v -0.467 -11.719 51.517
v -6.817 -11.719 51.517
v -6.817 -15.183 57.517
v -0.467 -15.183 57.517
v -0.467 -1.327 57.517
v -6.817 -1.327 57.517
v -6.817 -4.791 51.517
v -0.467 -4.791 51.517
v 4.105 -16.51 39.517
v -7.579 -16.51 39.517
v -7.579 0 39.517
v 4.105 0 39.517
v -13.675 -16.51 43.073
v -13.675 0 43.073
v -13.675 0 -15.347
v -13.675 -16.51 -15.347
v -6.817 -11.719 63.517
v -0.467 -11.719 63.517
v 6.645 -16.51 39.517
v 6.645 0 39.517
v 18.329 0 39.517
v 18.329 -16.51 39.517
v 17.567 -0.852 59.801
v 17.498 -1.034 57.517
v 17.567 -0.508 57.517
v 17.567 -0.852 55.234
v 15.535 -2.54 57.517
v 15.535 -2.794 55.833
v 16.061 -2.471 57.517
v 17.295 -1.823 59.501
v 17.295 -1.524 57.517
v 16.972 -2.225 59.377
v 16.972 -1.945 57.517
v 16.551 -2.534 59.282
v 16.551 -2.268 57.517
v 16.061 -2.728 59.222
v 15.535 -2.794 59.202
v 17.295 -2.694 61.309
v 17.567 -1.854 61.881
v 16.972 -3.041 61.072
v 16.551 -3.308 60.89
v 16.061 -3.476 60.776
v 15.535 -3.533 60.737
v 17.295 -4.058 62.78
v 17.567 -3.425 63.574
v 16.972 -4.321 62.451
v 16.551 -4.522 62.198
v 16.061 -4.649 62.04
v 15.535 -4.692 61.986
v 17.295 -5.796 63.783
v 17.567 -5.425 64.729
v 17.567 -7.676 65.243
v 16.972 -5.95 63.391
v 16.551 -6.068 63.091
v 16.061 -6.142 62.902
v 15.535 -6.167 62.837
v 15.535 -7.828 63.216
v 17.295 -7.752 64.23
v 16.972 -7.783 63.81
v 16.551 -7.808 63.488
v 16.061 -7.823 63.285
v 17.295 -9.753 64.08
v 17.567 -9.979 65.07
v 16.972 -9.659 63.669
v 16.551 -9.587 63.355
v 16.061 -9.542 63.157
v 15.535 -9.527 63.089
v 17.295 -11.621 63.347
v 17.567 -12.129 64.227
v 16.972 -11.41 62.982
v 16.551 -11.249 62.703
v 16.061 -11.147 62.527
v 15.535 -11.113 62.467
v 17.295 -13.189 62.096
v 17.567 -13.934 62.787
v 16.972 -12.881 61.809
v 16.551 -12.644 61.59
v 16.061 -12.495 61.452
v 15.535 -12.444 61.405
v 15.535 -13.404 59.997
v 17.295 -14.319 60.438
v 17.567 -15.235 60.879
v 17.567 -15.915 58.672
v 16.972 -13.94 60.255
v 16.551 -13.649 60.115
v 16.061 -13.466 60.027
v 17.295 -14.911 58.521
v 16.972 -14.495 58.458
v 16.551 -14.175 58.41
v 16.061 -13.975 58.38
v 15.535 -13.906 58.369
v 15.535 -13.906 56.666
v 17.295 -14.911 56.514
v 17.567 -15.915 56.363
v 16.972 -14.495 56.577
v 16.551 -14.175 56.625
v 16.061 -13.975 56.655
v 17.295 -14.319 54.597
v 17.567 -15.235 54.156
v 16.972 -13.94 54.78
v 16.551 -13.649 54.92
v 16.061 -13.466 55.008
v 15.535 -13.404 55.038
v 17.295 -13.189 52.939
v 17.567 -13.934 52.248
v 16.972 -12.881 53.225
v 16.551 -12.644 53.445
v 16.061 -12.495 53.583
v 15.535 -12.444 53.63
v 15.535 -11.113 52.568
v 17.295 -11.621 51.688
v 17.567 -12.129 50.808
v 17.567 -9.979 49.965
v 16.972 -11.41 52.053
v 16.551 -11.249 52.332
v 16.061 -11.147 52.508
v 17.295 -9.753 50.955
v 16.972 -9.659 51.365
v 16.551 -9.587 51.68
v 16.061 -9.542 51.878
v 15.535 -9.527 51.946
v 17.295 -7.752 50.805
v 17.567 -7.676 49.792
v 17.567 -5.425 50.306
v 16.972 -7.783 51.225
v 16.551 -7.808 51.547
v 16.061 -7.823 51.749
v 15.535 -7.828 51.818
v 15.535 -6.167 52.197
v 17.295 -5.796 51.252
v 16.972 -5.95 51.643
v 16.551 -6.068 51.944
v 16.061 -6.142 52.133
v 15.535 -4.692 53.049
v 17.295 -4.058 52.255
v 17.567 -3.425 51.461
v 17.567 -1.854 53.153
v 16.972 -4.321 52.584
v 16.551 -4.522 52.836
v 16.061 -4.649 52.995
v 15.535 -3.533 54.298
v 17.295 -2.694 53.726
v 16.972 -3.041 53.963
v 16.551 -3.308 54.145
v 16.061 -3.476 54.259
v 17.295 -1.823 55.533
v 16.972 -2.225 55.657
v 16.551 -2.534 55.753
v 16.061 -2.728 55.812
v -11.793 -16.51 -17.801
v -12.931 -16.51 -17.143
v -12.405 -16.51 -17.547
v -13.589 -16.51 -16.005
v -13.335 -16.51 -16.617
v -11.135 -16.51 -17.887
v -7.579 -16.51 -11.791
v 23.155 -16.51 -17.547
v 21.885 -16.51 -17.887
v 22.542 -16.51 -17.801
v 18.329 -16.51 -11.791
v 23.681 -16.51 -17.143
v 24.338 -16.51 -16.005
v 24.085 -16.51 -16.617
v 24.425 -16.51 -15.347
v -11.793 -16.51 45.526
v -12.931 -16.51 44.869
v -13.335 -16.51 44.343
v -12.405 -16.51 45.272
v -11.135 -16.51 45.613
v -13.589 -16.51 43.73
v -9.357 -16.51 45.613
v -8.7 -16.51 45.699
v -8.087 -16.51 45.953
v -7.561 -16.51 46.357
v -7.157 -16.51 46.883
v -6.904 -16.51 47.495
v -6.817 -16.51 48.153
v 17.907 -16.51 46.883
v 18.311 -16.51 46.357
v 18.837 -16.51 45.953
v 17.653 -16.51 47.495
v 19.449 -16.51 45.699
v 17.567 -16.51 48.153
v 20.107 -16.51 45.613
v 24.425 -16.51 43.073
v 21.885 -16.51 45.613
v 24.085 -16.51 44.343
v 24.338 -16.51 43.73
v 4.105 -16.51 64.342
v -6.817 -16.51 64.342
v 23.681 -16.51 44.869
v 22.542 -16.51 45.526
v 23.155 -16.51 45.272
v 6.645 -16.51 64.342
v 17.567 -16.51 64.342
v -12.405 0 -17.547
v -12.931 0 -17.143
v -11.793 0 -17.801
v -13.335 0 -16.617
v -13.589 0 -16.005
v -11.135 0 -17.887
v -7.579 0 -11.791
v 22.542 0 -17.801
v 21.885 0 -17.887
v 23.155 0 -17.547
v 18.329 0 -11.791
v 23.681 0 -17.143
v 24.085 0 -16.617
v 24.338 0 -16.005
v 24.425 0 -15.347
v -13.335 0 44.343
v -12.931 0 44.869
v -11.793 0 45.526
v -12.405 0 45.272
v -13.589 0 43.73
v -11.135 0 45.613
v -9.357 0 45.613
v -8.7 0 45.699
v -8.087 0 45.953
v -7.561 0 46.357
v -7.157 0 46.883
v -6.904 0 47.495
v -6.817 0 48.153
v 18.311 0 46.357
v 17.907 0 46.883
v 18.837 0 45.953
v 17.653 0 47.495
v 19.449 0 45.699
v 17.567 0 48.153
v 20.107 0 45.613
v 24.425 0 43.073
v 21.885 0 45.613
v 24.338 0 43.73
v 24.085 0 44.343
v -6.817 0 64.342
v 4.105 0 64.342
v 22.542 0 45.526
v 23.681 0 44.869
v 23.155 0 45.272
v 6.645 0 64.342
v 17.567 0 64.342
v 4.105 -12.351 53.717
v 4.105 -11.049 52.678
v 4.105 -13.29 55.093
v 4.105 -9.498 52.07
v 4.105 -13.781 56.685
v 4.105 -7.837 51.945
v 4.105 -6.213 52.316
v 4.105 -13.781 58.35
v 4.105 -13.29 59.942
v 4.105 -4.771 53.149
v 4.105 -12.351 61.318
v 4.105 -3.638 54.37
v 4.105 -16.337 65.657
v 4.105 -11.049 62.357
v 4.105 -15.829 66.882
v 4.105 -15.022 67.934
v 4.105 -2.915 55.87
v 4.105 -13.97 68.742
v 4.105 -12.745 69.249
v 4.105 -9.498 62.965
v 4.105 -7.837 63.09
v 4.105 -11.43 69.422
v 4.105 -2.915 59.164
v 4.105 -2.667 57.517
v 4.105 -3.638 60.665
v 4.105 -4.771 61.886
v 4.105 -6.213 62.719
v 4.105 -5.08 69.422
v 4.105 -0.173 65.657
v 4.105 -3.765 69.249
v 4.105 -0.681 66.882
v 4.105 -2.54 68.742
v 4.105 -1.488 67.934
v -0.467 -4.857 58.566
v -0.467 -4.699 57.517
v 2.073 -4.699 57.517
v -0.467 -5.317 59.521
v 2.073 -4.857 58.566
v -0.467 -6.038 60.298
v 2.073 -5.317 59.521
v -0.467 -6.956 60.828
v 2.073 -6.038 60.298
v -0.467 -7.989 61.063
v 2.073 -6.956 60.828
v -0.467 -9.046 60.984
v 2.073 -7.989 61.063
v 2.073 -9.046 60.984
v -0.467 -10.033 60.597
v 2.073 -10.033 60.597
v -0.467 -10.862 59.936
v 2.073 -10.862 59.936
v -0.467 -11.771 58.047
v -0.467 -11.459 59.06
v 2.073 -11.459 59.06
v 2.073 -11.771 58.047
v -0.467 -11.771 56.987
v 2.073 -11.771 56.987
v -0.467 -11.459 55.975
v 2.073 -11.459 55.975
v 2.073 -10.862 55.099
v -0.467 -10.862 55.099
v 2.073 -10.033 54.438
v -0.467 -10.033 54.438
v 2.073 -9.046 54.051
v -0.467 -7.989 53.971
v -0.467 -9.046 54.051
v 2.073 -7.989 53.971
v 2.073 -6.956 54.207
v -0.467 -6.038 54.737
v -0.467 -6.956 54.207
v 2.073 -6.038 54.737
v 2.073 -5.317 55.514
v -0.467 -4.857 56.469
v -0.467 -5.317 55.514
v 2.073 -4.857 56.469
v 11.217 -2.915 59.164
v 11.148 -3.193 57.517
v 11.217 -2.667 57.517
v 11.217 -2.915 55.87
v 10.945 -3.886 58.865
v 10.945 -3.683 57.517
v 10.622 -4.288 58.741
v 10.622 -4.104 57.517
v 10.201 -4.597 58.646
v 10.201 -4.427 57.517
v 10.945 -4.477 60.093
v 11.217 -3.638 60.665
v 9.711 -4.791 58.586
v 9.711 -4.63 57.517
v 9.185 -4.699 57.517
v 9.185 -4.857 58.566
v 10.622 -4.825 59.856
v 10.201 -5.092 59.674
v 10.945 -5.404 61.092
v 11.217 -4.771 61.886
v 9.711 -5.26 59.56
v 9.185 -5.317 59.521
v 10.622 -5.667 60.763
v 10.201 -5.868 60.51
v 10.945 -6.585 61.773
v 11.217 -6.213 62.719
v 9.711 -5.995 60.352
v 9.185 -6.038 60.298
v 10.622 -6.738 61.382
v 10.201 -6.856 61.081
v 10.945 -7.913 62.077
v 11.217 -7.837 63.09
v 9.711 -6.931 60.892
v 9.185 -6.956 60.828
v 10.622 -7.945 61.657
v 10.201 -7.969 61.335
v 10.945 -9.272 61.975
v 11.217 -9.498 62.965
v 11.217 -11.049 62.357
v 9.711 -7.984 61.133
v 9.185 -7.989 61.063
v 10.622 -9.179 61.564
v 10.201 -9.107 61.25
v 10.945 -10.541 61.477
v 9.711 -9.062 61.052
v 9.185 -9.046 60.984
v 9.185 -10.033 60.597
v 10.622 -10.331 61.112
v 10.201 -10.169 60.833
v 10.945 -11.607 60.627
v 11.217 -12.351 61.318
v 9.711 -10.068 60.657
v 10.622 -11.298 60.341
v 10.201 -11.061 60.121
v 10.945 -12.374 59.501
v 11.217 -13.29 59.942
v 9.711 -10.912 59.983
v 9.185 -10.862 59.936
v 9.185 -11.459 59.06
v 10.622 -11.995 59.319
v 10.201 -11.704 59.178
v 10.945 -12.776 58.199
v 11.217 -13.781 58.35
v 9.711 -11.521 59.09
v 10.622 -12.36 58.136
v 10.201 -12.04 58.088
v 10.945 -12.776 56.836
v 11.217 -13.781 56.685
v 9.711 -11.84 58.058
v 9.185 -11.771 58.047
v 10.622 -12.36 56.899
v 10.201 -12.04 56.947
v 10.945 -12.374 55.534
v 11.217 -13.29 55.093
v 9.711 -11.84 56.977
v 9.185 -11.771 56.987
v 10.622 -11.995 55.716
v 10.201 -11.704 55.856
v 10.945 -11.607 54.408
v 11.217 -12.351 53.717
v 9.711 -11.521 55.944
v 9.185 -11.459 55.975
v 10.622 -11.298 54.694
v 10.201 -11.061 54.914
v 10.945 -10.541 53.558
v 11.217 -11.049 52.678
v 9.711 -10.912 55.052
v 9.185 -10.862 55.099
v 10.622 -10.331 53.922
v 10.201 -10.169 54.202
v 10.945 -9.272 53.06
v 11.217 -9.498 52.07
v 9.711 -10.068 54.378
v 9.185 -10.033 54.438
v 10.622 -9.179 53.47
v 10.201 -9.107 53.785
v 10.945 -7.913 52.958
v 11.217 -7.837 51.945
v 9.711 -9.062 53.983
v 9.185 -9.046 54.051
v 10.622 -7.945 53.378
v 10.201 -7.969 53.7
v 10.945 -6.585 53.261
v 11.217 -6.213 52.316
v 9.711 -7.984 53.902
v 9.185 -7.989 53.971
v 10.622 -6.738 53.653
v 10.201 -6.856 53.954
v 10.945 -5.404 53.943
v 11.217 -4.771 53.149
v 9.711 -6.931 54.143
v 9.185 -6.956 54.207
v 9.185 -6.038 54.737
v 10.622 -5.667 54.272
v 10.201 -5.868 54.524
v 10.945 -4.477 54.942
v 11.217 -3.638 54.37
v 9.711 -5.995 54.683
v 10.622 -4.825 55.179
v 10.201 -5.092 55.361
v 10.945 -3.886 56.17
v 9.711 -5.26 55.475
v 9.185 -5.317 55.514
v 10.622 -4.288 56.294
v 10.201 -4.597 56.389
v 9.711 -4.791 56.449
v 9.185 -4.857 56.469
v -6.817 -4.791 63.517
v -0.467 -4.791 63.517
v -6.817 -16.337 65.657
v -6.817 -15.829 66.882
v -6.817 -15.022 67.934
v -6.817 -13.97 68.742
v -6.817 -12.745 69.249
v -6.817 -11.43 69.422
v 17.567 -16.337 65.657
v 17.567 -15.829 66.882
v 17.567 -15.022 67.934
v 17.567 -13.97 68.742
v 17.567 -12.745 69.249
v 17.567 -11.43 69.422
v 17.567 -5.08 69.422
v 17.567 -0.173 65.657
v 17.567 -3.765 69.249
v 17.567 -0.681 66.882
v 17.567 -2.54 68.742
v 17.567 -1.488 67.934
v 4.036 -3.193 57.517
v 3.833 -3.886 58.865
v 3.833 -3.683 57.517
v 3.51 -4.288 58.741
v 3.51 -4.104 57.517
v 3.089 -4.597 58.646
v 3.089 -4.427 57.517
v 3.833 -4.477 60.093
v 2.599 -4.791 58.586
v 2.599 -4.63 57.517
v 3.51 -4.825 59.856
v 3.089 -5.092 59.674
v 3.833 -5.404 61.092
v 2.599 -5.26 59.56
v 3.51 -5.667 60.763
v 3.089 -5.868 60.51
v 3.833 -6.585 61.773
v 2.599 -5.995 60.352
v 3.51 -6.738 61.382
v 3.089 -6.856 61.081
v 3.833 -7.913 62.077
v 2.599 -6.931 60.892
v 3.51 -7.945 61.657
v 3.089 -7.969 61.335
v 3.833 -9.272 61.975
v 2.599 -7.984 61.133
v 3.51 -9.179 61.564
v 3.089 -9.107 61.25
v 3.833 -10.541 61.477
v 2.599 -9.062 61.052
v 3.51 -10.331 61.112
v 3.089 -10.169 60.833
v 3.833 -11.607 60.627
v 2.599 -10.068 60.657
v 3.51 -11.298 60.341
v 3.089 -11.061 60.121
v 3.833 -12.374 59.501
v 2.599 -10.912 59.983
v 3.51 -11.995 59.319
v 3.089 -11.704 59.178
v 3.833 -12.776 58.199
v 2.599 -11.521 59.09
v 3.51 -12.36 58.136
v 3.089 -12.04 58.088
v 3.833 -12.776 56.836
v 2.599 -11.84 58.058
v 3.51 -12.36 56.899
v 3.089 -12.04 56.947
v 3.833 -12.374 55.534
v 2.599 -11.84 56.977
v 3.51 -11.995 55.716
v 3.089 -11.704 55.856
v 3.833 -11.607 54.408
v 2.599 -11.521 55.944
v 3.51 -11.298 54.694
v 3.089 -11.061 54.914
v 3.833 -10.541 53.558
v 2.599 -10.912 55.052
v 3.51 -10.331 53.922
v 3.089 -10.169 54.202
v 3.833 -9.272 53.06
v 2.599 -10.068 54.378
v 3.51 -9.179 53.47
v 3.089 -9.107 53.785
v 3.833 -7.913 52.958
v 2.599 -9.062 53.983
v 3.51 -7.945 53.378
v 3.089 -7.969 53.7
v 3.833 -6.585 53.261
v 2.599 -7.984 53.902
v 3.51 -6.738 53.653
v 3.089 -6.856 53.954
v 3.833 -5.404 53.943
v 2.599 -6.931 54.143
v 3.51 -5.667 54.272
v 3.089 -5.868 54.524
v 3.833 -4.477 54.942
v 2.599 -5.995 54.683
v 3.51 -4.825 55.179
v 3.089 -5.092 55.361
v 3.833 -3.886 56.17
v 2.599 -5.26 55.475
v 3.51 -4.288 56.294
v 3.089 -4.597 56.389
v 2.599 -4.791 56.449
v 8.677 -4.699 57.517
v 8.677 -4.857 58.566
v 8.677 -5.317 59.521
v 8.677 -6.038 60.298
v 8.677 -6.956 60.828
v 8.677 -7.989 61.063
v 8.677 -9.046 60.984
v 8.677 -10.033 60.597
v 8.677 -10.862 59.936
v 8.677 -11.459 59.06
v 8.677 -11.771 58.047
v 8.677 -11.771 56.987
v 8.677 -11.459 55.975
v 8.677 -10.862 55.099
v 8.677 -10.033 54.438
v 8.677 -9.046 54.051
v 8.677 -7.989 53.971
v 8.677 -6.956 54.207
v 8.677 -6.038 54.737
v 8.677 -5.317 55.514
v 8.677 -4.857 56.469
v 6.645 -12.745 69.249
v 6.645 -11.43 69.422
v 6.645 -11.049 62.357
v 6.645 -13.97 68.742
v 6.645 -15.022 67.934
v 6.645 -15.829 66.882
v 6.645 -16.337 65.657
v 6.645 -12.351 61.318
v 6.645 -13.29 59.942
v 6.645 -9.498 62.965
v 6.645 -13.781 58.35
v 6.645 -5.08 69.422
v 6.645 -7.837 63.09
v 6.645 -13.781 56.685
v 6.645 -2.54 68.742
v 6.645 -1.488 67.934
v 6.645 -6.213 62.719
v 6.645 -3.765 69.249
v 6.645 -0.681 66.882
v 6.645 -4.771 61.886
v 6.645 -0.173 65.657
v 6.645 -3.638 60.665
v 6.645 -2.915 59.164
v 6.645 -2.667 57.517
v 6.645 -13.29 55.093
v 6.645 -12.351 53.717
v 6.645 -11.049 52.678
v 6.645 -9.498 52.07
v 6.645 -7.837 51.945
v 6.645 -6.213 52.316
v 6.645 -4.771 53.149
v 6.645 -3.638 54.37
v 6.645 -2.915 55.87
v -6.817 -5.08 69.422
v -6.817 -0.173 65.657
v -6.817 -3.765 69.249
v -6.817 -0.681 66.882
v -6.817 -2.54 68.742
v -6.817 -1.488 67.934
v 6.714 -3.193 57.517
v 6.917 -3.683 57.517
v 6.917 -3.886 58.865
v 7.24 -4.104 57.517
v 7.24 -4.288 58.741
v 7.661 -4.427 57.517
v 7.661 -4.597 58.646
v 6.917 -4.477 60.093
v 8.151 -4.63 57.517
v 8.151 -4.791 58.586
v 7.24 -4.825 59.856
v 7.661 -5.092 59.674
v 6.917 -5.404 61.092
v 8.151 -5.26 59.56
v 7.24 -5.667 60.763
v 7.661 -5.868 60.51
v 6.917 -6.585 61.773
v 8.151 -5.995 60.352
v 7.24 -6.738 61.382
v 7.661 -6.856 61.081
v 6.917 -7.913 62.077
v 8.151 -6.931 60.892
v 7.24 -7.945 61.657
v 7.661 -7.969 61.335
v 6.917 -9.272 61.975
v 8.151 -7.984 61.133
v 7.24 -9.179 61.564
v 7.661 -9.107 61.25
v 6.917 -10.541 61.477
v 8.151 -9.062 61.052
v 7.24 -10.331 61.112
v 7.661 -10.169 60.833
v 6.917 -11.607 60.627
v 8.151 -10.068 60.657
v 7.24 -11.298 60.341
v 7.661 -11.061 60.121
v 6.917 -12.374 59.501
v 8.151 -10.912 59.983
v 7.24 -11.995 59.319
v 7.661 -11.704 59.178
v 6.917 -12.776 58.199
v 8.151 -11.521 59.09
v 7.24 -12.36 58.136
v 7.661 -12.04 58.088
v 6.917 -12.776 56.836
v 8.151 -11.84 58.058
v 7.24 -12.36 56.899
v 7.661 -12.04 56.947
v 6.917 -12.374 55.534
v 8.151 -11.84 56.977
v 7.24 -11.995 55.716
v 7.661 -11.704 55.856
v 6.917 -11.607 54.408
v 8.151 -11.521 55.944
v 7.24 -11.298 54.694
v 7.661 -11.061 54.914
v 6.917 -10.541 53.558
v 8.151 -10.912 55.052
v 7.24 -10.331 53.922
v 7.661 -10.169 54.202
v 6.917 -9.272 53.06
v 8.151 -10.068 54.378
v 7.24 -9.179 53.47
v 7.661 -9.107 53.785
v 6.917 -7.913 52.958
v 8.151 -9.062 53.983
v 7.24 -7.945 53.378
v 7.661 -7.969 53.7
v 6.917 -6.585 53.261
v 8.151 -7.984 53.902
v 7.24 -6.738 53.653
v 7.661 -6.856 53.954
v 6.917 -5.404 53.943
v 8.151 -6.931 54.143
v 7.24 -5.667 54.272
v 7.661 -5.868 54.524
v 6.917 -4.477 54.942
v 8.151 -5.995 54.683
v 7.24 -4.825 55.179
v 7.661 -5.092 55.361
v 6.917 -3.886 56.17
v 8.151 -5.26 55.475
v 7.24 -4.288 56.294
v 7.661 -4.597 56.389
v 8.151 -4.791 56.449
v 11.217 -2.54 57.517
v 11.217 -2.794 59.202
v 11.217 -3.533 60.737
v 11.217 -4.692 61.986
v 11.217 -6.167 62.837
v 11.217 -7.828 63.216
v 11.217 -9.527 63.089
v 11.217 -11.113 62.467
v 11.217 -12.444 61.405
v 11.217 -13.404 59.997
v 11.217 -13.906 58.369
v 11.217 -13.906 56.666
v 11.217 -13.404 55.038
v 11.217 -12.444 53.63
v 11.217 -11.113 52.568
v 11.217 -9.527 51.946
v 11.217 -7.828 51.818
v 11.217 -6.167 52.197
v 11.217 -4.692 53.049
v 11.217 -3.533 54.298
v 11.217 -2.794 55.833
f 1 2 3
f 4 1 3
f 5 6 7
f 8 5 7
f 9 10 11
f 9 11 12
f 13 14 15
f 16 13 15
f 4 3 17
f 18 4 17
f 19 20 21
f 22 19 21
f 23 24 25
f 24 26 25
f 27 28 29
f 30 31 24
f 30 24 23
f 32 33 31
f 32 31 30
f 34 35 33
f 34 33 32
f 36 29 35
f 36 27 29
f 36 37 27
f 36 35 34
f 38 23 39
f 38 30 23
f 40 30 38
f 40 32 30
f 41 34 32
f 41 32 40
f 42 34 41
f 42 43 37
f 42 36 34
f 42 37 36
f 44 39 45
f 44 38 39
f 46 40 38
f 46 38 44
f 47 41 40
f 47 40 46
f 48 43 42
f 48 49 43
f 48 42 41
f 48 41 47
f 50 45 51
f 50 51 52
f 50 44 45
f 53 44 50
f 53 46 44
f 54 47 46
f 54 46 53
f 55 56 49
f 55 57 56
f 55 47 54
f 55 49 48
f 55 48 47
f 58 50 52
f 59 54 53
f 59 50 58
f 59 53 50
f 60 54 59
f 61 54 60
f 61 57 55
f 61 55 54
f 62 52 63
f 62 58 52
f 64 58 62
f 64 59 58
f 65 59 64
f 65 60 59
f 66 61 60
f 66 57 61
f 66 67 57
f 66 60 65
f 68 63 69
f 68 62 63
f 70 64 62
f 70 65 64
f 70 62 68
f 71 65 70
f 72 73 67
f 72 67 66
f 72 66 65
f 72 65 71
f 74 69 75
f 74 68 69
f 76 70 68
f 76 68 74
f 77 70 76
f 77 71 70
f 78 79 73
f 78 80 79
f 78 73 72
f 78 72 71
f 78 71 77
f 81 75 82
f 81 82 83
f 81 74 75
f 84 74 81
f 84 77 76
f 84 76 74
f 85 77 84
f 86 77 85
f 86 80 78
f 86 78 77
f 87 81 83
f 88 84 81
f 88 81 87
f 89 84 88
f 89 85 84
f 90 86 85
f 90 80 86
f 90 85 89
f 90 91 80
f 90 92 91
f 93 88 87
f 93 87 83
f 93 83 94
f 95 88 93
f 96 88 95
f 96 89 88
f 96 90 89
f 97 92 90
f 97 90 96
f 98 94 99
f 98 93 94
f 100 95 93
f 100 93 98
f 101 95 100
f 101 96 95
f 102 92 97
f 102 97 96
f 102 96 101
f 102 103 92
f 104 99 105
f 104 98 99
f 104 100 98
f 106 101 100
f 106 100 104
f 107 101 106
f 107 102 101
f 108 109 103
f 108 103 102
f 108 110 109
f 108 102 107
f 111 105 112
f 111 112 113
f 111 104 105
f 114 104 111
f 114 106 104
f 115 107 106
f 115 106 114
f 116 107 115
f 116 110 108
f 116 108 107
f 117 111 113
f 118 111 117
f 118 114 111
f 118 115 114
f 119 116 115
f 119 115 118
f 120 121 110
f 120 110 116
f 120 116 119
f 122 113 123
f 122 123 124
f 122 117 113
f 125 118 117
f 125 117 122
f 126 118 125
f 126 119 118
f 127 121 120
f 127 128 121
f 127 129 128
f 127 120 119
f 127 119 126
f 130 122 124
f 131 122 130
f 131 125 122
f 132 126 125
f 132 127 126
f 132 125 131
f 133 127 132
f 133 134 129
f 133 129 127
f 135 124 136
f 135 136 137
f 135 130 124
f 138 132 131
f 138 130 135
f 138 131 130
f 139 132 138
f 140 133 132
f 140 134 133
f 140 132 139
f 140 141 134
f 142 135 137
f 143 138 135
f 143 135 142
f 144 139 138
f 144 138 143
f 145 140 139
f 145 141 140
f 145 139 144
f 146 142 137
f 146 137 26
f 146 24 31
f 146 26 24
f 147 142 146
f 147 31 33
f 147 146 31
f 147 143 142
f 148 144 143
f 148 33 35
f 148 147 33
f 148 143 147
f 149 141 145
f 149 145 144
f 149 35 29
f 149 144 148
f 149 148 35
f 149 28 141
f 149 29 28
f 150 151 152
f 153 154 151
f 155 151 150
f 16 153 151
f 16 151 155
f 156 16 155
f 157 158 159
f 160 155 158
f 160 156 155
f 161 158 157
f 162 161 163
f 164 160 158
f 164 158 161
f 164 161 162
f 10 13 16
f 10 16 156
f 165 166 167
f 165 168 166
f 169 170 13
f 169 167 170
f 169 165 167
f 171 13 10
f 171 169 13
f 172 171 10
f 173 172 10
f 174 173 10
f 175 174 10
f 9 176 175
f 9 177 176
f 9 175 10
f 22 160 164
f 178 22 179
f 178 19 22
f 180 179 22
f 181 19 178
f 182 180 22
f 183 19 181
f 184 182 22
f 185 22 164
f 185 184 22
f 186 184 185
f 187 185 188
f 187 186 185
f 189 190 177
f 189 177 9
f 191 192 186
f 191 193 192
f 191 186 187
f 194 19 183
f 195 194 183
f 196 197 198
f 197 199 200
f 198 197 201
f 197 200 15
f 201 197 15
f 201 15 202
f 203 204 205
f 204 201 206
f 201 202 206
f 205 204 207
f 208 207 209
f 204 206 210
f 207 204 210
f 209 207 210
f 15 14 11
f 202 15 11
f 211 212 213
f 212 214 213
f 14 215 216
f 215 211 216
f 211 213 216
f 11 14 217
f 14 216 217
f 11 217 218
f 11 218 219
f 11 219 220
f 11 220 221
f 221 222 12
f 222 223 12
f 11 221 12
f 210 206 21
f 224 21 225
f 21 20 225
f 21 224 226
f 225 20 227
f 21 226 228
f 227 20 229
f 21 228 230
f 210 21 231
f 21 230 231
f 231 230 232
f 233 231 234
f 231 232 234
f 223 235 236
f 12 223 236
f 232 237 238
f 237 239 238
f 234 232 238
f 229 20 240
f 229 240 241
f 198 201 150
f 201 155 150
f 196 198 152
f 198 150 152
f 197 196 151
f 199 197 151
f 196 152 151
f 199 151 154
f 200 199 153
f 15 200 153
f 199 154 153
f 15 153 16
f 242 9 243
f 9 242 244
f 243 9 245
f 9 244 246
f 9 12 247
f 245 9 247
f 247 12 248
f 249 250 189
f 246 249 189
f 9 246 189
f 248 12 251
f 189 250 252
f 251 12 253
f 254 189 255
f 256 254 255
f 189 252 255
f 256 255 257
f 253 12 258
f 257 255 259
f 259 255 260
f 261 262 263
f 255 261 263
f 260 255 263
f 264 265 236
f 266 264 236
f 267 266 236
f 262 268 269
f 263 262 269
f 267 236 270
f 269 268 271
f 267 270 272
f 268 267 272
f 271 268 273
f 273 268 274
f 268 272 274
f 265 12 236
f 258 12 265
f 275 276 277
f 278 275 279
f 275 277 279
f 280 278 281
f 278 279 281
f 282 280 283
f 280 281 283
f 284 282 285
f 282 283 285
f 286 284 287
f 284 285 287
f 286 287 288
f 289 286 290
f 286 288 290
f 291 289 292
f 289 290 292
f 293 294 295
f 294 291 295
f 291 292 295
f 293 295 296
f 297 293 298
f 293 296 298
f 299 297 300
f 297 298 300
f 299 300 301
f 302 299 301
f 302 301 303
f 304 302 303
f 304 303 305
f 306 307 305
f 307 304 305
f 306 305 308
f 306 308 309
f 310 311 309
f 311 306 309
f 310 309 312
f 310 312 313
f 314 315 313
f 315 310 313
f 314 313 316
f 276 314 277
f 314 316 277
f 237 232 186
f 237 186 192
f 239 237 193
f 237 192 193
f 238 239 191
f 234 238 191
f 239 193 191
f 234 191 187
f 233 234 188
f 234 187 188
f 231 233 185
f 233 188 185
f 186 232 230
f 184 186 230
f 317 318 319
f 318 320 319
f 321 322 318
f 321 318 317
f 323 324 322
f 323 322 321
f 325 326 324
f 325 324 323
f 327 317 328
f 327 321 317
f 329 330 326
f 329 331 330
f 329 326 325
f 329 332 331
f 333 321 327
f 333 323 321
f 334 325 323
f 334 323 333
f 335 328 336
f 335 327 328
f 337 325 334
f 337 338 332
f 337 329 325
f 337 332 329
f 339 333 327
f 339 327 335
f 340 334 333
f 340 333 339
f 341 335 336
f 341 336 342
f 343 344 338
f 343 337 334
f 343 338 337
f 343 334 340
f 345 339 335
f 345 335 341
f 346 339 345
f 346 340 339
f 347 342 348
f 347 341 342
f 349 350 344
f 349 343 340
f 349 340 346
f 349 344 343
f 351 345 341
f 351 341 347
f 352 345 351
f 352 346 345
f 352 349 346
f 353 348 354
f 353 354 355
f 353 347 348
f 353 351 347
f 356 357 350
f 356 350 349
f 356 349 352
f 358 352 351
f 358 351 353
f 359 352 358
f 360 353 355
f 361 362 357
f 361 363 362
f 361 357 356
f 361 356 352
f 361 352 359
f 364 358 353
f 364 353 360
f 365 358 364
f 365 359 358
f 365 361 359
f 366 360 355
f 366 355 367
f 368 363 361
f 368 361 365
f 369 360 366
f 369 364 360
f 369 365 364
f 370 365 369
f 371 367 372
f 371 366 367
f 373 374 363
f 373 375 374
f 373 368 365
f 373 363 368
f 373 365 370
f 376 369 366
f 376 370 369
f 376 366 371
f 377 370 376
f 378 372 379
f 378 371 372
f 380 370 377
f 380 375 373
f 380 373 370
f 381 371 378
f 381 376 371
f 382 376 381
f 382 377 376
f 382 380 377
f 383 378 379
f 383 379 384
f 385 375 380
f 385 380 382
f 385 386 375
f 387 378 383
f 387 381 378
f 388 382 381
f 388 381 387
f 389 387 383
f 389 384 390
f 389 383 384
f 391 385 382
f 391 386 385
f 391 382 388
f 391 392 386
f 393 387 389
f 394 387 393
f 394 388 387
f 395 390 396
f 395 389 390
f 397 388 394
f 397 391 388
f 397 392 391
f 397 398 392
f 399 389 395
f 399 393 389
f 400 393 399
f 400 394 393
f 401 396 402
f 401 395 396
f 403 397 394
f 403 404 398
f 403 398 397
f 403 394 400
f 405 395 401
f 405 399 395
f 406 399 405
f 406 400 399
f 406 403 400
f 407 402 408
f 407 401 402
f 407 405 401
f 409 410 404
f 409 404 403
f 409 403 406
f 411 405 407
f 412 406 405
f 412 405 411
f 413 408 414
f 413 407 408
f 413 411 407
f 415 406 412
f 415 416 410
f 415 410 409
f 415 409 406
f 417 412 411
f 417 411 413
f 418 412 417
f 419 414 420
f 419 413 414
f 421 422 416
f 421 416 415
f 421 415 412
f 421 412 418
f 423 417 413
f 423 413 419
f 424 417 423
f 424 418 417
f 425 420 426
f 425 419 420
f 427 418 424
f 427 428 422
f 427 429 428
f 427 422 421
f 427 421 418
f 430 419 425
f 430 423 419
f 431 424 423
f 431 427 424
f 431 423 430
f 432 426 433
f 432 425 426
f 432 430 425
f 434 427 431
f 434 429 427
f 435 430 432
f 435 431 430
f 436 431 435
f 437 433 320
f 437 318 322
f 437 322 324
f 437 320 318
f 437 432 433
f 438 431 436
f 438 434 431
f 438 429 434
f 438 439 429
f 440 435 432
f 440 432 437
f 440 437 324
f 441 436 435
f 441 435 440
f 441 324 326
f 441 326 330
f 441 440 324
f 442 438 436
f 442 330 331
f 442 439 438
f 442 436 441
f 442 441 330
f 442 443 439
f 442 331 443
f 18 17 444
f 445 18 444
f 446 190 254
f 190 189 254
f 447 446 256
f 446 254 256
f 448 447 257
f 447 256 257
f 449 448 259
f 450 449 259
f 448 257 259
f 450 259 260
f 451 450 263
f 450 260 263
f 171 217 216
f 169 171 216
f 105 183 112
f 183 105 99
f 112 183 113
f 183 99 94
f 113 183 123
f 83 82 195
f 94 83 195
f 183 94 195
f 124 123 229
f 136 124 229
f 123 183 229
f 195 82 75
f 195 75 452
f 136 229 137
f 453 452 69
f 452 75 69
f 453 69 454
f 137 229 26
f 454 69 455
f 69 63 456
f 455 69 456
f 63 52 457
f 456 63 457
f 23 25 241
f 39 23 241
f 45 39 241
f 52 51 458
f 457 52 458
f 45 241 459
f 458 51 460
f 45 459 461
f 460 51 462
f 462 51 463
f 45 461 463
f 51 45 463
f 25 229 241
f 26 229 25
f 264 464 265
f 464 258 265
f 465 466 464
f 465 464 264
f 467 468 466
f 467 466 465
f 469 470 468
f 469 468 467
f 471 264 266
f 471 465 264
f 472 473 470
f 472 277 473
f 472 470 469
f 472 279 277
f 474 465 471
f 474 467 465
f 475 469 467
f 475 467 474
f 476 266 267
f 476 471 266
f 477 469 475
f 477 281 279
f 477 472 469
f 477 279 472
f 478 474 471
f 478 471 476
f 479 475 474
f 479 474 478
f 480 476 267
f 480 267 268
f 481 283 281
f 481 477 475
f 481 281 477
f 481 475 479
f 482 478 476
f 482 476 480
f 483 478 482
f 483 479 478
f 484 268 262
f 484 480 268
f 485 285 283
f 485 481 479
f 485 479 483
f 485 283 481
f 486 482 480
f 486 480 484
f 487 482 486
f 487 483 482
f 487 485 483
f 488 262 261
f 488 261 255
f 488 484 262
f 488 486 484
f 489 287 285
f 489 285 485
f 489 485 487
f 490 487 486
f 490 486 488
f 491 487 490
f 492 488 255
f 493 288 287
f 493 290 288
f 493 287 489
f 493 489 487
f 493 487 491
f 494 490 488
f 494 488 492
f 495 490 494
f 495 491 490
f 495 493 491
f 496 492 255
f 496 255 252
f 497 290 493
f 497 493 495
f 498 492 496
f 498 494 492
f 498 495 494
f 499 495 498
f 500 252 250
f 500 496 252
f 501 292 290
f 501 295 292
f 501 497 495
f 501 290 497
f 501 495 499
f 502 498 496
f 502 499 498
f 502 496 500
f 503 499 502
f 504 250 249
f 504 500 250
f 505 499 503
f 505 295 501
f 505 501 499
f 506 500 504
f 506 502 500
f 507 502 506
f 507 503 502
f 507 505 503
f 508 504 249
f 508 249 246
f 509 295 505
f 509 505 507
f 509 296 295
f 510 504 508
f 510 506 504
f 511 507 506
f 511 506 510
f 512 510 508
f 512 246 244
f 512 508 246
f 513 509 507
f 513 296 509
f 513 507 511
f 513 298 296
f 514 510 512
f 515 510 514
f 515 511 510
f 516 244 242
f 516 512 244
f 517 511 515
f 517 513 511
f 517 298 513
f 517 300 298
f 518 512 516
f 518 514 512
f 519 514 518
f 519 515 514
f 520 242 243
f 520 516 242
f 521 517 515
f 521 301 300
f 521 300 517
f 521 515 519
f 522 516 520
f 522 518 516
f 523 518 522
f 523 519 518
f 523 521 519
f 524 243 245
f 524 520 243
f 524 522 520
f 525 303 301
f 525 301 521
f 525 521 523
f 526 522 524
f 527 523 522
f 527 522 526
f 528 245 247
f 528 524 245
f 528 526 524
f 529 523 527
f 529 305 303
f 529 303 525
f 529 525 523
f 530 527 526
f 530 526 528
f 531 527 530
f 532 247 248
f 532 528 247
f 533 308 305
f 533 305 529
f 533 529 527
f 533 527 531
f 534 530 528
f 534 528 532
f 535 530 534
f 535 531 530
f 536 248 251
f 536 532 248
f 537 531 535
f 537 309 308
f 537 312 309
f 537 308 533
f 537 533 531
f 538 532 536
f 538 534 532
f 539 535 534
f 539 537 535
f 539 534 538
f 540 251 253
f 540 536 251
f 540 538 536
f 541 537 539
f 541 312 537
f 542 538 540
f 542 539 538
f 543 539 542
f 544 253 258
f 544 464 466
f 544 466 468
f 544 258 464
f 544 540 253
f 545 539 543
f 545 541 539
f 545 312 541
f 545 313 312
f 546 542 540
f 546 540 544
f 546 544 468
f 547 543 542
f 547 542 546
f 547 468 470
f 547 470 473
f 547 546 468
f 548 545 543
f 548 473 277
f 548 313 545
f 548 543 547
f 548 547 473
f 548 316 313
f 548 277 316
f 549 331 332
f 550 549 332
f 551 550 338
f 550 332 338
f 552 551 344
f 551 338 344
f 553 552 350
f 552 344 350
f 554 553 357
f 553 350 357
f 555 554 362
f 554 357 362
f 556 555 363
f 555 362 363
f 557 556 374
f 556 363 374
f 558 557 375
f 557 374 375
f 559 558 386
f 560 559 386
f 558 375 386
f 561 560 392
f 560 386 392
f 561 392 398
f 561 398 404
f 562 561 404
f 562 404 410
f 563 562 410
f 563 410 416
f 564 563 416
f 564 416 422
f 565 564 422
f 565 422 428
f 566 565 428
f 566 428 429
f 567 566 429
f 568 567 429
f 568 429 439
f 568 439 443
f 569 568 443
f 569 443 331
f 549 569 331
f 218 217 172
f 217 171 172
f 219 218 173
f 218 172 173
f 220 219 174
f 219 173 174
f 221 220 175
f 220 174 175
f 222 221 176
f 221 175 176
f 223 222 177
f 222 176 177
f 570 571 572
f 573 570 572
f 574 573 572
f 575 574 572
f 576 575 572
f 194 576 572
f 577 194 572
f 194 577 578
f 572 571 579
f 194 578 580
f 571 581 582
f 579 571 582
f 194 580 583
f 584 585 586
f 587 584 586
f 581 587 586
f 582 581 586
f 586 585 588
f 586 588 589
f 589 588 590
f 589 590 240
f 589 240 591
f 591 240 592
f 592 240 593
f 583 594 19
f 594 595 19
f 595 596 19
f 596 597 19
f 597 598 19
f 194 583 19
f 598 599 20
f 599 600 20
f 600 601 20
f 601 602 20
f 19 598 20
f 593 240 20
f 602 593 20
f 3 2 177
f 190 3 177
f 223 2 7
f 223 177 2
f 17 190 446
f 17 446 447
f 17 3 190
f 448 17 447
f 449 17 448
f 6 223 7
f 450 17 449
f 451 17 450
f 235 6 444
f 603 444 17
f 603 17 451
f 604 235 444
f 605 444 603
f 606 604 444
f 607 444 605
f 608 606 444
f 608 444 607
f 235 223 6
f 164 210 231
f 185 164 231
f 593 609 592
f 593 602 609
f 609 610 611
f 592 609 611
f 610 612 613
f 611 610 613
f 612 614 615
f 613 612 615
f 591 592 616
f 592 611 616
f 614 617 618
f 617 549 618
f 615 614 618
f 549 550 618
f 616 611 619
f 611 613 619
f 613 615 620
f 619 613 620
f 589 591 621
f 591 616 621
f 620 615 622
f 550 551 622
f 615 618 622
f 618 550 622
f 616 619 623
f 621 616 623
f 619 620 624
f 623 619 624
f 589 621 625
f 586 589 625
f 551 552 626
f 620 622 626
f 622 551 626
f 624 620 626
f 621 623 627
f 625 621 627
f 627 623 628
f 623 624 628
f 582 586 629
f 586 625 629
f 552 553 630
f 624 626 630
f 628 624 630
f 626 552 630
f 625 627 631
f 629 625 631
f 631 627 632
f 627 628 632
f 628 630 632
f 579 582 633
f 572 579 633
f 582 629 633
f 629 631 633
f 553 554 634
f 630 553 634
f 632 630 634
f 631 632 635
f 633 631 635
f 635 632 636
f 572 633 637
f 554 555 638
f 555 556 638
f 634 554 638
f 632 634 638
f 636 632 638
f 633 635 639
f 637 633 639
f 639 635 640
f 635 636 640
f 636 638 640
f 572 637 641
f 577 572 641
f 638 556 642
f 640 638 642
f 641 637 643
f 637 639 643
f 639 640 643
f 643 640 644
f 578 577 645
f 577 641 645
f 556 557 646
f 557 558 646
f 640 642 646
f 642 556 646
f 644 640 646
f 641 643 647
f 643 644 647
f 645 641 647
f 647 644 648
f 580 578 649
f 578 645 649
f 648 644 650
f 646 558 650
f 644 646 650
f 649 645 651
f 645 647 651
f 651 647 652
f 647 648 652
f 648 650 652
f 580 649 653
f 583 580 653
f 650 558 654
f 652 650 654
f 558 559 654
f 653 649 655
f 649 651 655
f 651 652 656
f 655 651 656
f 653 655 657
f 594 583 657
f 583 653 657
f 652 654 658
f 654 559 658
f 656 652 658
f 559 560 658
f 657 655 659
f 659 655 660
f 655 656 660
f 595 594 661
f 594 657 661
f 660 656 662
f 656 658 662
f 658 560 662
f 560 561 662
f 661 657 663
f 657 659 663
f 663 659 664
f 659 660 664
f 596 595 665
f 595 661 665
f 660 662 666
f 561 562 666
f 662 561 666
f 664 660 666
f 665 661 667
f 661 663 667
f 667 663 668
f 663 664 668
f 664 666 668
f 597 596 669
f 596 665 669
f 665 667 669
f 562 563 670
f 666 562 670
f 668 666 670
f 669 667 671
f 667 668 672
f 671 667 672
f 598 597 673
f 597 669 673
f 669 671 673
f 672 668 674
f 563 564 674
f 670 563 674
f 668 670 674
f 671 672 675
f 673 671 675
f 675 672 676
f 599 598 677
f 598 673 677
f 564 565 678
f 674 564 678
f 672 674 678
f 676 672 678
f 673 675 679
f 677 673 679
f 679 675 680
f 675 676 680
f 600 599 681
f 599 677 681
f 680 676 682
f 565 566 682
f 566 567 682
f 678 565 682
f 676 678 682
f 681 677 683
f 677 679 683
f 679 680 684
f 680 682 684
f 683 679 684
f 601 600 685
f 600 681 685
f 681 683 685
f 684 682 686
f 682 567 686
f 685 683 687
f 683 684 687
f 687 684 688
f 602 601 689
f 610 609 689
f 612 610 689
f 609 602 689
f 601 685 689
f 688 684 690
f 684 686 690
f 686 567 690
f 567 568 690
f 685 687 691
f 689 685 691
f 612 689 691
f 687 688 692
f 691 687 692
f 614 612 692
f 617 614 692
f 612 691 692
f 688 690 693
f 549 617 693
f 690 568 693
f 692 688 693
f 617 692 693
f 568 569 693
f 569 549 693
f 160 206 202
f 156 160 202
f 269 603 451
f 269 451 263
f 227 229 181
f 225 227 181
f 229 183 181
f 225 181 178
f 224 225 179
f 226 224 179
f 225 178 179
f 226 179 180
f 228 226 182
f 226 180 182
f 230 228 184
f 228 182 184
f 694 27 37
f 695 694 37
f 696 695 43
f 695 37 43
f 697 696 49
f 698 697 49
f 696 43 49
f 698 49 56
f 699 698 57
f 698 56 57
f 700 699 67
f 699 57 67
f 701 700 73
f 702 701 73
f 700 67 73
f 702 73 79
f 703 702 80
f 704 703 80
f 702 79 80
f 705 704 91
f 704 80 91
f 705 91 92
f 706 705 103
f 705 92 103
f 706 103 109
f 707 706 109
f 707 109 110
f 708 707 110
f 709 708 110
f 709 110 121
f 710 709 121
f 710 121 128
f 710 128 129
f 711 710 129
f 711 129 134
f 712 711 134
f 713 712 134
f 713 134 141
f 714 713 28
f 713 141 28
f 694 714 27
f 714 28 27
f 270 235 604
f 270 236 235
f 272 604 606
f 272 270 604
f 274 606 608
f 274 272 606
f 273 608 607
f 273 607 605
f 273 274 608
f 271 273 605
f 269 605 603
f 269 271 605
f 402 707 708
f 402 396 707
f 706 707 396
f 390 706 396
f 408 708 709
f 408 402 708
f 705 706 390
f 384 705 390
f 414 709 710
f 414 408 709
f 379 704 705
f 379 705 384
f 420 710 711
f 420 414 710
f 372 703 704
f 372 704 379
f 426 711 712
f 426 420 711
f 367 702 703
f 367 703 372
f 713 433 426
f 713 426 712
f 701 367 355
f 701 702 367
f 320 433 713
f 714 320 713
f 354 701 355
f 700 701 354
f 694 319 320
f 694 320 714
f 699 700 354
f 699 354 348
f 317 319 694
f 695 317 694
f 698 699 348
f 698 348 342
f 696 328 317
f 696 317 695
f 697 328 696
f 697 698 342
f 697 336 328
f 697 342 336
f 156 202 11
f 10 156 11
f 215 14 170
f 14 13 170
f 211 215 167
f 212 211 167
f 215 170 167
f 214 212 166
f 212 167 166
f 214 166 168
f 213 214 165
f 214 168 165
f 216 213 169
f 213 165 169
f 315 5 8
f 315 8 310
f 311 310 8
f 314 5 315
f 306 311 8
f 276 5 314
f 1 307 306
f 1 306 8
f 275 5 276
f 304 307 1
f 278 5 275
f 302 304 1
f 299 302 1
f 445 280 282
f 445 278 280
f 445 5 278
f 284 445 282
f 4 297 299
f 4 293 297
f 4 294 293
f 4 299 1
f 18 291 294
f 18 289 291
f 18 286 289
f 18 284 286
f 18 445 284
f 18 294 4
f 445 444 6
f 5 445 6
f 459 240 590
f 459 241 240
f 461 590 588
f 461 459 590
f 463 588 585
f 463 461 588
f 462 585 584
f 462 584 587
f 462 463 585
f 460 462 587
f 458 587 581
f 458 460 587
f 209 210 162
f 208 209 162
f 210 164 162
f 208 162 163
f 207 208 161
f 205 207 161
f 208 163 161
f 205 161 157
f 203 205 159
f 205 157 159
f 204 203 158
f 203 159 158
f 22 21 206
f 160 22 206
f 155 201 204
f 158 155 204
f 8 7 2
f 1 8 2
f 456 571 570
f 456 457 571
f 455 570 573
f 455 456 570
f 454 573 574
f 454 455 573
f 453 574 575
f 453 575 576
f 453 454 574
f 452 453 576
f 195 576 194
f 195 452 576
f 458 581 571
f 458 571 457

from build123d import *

# Parameters (mm, degrees)
F0_W     = 10.922
F0_H     = 23.809427796
F1_DEPTH = 16.51
F2_R     = 3.556
F3_DEPTH = 25.4
F4_R     = 3.556
F5_DEPTH = 6.35
F6_R     = 2.54
F7_R     = 5.08
F8_R     = 5.715
F9_DEPTH = 6.35
F10_R    = 2.032


with BuildPart() as f1:
    # F0 (on Front) → F1 (new body)
    with BuildSketch(Plane.XZ):
        with Locations((12.1058959829, 57.5174044678)):
            Rectangle(F0_W, F0_H)
        with Locations((-1.3561040171, 57.5174044678)):
            Rectangle(F0_W, F0_H)
        Polygon((-6.8171040171, 45.6126905698), (-13.6751040171, 45.6126905698), (-13.6751040171, -17.8873094302), (24.4248959829, -17.8873094302), (24.4248959829, 45.6126905698), (17.5668959829, 45.6126905698), (6.6448959829, 45.6126905698), (6.6448959829, 39.5166905698), (18.3288959829, 39.5166905698), (18.3288959829, -11.7913094302), (-7.5791040171, -11.7913094302), (-7.5791040171, 39.5166905698), (4.1048959829, 39.5166905698), (4.1048959829, 45.6126905698), align=None)
    extrude(amount=F1_DEPTH)

    # F2 (on face) → F3 (cut)
    with BuildSketch(Plane.YZ.offset(17.5668959829)):
        with Locations((-8.255, 57.5174044678)):
            Circle(F2_R)
    extrude(amount=-F3_DEPTH, mode=Mode.SUBTRACT)

    # F4 (on face) → F5 (cut)
    with BuildSketch(Plane(origin=(-6.8171040171, 0, 0), x_dir=(0, -1, 0), z_dir=(-1, 0, 0))):
        Polygon((4.7908983849, 51.5174044678), (11.7191016151, 51.5174044678), (15.1832032303, 57.5174044678), (11.7191016151, 63.5174044678), (4.7908983849, 63.5174044678), (1.3267967697, 57.5174044678), align=None)
        with Locations((8.255, 57.5174044678)):
            Circle(F4_R, mode=Mode.SUBTRACT)
    extrude(amount=-F5_DEPTH, mode=Mode.SUBTRACT)

    # F6
    f6_edges = [f1.edges().sort_by_distance(p)[0] for p in [
        (-13.675104, -8.255, 45.612691),
        (-6.817104, -8.255, 45.612691),
        (24.424896, -8.255, 45.612691),
        (17.566896, -8.255, 45.612691),
        (-13.675104, -8.255, -17.887309),
        (24.424896, -8.255, -17.887309),
    ]]
    fillet(f6_edges, radius=F6_R)

    # F7
    f7_edges = [f1.edges().sort_by_distance(p)[0] for p in [
        (12.105896, -16.51, 69.422118),
        (-1.356104, -16.51, 69.422118),
        (-1.356104, 0, 69.422118),
        (12.105896, 0, 69.422118),
    ]]
    fillet(f7_edges, radius=F7_R)

    # F8 (on face) → F9 (cut)
    with BuildSketch(Plane.YZ.offset(17.5668959829)):
        with Locations((-8.255, 57.5174044678)):
            Circle(F8_R)
    extrude(amount=-F9_DEPTH, mode=Mode.SUBTRACT)

    # F10
    f10_edges = [f1.edges().sort_by_distance(p)[0] for p in [
        (17.566896, -13.97, 57.517404),
        (11.216896, -11.811, 57.517404),
        (4.104896, -11.811, 57.517404),
        (6.644896, -11.811, 57.517404),
    ]]
    fillet(f10_edges, radius=F10_R)


solid = f1.part
